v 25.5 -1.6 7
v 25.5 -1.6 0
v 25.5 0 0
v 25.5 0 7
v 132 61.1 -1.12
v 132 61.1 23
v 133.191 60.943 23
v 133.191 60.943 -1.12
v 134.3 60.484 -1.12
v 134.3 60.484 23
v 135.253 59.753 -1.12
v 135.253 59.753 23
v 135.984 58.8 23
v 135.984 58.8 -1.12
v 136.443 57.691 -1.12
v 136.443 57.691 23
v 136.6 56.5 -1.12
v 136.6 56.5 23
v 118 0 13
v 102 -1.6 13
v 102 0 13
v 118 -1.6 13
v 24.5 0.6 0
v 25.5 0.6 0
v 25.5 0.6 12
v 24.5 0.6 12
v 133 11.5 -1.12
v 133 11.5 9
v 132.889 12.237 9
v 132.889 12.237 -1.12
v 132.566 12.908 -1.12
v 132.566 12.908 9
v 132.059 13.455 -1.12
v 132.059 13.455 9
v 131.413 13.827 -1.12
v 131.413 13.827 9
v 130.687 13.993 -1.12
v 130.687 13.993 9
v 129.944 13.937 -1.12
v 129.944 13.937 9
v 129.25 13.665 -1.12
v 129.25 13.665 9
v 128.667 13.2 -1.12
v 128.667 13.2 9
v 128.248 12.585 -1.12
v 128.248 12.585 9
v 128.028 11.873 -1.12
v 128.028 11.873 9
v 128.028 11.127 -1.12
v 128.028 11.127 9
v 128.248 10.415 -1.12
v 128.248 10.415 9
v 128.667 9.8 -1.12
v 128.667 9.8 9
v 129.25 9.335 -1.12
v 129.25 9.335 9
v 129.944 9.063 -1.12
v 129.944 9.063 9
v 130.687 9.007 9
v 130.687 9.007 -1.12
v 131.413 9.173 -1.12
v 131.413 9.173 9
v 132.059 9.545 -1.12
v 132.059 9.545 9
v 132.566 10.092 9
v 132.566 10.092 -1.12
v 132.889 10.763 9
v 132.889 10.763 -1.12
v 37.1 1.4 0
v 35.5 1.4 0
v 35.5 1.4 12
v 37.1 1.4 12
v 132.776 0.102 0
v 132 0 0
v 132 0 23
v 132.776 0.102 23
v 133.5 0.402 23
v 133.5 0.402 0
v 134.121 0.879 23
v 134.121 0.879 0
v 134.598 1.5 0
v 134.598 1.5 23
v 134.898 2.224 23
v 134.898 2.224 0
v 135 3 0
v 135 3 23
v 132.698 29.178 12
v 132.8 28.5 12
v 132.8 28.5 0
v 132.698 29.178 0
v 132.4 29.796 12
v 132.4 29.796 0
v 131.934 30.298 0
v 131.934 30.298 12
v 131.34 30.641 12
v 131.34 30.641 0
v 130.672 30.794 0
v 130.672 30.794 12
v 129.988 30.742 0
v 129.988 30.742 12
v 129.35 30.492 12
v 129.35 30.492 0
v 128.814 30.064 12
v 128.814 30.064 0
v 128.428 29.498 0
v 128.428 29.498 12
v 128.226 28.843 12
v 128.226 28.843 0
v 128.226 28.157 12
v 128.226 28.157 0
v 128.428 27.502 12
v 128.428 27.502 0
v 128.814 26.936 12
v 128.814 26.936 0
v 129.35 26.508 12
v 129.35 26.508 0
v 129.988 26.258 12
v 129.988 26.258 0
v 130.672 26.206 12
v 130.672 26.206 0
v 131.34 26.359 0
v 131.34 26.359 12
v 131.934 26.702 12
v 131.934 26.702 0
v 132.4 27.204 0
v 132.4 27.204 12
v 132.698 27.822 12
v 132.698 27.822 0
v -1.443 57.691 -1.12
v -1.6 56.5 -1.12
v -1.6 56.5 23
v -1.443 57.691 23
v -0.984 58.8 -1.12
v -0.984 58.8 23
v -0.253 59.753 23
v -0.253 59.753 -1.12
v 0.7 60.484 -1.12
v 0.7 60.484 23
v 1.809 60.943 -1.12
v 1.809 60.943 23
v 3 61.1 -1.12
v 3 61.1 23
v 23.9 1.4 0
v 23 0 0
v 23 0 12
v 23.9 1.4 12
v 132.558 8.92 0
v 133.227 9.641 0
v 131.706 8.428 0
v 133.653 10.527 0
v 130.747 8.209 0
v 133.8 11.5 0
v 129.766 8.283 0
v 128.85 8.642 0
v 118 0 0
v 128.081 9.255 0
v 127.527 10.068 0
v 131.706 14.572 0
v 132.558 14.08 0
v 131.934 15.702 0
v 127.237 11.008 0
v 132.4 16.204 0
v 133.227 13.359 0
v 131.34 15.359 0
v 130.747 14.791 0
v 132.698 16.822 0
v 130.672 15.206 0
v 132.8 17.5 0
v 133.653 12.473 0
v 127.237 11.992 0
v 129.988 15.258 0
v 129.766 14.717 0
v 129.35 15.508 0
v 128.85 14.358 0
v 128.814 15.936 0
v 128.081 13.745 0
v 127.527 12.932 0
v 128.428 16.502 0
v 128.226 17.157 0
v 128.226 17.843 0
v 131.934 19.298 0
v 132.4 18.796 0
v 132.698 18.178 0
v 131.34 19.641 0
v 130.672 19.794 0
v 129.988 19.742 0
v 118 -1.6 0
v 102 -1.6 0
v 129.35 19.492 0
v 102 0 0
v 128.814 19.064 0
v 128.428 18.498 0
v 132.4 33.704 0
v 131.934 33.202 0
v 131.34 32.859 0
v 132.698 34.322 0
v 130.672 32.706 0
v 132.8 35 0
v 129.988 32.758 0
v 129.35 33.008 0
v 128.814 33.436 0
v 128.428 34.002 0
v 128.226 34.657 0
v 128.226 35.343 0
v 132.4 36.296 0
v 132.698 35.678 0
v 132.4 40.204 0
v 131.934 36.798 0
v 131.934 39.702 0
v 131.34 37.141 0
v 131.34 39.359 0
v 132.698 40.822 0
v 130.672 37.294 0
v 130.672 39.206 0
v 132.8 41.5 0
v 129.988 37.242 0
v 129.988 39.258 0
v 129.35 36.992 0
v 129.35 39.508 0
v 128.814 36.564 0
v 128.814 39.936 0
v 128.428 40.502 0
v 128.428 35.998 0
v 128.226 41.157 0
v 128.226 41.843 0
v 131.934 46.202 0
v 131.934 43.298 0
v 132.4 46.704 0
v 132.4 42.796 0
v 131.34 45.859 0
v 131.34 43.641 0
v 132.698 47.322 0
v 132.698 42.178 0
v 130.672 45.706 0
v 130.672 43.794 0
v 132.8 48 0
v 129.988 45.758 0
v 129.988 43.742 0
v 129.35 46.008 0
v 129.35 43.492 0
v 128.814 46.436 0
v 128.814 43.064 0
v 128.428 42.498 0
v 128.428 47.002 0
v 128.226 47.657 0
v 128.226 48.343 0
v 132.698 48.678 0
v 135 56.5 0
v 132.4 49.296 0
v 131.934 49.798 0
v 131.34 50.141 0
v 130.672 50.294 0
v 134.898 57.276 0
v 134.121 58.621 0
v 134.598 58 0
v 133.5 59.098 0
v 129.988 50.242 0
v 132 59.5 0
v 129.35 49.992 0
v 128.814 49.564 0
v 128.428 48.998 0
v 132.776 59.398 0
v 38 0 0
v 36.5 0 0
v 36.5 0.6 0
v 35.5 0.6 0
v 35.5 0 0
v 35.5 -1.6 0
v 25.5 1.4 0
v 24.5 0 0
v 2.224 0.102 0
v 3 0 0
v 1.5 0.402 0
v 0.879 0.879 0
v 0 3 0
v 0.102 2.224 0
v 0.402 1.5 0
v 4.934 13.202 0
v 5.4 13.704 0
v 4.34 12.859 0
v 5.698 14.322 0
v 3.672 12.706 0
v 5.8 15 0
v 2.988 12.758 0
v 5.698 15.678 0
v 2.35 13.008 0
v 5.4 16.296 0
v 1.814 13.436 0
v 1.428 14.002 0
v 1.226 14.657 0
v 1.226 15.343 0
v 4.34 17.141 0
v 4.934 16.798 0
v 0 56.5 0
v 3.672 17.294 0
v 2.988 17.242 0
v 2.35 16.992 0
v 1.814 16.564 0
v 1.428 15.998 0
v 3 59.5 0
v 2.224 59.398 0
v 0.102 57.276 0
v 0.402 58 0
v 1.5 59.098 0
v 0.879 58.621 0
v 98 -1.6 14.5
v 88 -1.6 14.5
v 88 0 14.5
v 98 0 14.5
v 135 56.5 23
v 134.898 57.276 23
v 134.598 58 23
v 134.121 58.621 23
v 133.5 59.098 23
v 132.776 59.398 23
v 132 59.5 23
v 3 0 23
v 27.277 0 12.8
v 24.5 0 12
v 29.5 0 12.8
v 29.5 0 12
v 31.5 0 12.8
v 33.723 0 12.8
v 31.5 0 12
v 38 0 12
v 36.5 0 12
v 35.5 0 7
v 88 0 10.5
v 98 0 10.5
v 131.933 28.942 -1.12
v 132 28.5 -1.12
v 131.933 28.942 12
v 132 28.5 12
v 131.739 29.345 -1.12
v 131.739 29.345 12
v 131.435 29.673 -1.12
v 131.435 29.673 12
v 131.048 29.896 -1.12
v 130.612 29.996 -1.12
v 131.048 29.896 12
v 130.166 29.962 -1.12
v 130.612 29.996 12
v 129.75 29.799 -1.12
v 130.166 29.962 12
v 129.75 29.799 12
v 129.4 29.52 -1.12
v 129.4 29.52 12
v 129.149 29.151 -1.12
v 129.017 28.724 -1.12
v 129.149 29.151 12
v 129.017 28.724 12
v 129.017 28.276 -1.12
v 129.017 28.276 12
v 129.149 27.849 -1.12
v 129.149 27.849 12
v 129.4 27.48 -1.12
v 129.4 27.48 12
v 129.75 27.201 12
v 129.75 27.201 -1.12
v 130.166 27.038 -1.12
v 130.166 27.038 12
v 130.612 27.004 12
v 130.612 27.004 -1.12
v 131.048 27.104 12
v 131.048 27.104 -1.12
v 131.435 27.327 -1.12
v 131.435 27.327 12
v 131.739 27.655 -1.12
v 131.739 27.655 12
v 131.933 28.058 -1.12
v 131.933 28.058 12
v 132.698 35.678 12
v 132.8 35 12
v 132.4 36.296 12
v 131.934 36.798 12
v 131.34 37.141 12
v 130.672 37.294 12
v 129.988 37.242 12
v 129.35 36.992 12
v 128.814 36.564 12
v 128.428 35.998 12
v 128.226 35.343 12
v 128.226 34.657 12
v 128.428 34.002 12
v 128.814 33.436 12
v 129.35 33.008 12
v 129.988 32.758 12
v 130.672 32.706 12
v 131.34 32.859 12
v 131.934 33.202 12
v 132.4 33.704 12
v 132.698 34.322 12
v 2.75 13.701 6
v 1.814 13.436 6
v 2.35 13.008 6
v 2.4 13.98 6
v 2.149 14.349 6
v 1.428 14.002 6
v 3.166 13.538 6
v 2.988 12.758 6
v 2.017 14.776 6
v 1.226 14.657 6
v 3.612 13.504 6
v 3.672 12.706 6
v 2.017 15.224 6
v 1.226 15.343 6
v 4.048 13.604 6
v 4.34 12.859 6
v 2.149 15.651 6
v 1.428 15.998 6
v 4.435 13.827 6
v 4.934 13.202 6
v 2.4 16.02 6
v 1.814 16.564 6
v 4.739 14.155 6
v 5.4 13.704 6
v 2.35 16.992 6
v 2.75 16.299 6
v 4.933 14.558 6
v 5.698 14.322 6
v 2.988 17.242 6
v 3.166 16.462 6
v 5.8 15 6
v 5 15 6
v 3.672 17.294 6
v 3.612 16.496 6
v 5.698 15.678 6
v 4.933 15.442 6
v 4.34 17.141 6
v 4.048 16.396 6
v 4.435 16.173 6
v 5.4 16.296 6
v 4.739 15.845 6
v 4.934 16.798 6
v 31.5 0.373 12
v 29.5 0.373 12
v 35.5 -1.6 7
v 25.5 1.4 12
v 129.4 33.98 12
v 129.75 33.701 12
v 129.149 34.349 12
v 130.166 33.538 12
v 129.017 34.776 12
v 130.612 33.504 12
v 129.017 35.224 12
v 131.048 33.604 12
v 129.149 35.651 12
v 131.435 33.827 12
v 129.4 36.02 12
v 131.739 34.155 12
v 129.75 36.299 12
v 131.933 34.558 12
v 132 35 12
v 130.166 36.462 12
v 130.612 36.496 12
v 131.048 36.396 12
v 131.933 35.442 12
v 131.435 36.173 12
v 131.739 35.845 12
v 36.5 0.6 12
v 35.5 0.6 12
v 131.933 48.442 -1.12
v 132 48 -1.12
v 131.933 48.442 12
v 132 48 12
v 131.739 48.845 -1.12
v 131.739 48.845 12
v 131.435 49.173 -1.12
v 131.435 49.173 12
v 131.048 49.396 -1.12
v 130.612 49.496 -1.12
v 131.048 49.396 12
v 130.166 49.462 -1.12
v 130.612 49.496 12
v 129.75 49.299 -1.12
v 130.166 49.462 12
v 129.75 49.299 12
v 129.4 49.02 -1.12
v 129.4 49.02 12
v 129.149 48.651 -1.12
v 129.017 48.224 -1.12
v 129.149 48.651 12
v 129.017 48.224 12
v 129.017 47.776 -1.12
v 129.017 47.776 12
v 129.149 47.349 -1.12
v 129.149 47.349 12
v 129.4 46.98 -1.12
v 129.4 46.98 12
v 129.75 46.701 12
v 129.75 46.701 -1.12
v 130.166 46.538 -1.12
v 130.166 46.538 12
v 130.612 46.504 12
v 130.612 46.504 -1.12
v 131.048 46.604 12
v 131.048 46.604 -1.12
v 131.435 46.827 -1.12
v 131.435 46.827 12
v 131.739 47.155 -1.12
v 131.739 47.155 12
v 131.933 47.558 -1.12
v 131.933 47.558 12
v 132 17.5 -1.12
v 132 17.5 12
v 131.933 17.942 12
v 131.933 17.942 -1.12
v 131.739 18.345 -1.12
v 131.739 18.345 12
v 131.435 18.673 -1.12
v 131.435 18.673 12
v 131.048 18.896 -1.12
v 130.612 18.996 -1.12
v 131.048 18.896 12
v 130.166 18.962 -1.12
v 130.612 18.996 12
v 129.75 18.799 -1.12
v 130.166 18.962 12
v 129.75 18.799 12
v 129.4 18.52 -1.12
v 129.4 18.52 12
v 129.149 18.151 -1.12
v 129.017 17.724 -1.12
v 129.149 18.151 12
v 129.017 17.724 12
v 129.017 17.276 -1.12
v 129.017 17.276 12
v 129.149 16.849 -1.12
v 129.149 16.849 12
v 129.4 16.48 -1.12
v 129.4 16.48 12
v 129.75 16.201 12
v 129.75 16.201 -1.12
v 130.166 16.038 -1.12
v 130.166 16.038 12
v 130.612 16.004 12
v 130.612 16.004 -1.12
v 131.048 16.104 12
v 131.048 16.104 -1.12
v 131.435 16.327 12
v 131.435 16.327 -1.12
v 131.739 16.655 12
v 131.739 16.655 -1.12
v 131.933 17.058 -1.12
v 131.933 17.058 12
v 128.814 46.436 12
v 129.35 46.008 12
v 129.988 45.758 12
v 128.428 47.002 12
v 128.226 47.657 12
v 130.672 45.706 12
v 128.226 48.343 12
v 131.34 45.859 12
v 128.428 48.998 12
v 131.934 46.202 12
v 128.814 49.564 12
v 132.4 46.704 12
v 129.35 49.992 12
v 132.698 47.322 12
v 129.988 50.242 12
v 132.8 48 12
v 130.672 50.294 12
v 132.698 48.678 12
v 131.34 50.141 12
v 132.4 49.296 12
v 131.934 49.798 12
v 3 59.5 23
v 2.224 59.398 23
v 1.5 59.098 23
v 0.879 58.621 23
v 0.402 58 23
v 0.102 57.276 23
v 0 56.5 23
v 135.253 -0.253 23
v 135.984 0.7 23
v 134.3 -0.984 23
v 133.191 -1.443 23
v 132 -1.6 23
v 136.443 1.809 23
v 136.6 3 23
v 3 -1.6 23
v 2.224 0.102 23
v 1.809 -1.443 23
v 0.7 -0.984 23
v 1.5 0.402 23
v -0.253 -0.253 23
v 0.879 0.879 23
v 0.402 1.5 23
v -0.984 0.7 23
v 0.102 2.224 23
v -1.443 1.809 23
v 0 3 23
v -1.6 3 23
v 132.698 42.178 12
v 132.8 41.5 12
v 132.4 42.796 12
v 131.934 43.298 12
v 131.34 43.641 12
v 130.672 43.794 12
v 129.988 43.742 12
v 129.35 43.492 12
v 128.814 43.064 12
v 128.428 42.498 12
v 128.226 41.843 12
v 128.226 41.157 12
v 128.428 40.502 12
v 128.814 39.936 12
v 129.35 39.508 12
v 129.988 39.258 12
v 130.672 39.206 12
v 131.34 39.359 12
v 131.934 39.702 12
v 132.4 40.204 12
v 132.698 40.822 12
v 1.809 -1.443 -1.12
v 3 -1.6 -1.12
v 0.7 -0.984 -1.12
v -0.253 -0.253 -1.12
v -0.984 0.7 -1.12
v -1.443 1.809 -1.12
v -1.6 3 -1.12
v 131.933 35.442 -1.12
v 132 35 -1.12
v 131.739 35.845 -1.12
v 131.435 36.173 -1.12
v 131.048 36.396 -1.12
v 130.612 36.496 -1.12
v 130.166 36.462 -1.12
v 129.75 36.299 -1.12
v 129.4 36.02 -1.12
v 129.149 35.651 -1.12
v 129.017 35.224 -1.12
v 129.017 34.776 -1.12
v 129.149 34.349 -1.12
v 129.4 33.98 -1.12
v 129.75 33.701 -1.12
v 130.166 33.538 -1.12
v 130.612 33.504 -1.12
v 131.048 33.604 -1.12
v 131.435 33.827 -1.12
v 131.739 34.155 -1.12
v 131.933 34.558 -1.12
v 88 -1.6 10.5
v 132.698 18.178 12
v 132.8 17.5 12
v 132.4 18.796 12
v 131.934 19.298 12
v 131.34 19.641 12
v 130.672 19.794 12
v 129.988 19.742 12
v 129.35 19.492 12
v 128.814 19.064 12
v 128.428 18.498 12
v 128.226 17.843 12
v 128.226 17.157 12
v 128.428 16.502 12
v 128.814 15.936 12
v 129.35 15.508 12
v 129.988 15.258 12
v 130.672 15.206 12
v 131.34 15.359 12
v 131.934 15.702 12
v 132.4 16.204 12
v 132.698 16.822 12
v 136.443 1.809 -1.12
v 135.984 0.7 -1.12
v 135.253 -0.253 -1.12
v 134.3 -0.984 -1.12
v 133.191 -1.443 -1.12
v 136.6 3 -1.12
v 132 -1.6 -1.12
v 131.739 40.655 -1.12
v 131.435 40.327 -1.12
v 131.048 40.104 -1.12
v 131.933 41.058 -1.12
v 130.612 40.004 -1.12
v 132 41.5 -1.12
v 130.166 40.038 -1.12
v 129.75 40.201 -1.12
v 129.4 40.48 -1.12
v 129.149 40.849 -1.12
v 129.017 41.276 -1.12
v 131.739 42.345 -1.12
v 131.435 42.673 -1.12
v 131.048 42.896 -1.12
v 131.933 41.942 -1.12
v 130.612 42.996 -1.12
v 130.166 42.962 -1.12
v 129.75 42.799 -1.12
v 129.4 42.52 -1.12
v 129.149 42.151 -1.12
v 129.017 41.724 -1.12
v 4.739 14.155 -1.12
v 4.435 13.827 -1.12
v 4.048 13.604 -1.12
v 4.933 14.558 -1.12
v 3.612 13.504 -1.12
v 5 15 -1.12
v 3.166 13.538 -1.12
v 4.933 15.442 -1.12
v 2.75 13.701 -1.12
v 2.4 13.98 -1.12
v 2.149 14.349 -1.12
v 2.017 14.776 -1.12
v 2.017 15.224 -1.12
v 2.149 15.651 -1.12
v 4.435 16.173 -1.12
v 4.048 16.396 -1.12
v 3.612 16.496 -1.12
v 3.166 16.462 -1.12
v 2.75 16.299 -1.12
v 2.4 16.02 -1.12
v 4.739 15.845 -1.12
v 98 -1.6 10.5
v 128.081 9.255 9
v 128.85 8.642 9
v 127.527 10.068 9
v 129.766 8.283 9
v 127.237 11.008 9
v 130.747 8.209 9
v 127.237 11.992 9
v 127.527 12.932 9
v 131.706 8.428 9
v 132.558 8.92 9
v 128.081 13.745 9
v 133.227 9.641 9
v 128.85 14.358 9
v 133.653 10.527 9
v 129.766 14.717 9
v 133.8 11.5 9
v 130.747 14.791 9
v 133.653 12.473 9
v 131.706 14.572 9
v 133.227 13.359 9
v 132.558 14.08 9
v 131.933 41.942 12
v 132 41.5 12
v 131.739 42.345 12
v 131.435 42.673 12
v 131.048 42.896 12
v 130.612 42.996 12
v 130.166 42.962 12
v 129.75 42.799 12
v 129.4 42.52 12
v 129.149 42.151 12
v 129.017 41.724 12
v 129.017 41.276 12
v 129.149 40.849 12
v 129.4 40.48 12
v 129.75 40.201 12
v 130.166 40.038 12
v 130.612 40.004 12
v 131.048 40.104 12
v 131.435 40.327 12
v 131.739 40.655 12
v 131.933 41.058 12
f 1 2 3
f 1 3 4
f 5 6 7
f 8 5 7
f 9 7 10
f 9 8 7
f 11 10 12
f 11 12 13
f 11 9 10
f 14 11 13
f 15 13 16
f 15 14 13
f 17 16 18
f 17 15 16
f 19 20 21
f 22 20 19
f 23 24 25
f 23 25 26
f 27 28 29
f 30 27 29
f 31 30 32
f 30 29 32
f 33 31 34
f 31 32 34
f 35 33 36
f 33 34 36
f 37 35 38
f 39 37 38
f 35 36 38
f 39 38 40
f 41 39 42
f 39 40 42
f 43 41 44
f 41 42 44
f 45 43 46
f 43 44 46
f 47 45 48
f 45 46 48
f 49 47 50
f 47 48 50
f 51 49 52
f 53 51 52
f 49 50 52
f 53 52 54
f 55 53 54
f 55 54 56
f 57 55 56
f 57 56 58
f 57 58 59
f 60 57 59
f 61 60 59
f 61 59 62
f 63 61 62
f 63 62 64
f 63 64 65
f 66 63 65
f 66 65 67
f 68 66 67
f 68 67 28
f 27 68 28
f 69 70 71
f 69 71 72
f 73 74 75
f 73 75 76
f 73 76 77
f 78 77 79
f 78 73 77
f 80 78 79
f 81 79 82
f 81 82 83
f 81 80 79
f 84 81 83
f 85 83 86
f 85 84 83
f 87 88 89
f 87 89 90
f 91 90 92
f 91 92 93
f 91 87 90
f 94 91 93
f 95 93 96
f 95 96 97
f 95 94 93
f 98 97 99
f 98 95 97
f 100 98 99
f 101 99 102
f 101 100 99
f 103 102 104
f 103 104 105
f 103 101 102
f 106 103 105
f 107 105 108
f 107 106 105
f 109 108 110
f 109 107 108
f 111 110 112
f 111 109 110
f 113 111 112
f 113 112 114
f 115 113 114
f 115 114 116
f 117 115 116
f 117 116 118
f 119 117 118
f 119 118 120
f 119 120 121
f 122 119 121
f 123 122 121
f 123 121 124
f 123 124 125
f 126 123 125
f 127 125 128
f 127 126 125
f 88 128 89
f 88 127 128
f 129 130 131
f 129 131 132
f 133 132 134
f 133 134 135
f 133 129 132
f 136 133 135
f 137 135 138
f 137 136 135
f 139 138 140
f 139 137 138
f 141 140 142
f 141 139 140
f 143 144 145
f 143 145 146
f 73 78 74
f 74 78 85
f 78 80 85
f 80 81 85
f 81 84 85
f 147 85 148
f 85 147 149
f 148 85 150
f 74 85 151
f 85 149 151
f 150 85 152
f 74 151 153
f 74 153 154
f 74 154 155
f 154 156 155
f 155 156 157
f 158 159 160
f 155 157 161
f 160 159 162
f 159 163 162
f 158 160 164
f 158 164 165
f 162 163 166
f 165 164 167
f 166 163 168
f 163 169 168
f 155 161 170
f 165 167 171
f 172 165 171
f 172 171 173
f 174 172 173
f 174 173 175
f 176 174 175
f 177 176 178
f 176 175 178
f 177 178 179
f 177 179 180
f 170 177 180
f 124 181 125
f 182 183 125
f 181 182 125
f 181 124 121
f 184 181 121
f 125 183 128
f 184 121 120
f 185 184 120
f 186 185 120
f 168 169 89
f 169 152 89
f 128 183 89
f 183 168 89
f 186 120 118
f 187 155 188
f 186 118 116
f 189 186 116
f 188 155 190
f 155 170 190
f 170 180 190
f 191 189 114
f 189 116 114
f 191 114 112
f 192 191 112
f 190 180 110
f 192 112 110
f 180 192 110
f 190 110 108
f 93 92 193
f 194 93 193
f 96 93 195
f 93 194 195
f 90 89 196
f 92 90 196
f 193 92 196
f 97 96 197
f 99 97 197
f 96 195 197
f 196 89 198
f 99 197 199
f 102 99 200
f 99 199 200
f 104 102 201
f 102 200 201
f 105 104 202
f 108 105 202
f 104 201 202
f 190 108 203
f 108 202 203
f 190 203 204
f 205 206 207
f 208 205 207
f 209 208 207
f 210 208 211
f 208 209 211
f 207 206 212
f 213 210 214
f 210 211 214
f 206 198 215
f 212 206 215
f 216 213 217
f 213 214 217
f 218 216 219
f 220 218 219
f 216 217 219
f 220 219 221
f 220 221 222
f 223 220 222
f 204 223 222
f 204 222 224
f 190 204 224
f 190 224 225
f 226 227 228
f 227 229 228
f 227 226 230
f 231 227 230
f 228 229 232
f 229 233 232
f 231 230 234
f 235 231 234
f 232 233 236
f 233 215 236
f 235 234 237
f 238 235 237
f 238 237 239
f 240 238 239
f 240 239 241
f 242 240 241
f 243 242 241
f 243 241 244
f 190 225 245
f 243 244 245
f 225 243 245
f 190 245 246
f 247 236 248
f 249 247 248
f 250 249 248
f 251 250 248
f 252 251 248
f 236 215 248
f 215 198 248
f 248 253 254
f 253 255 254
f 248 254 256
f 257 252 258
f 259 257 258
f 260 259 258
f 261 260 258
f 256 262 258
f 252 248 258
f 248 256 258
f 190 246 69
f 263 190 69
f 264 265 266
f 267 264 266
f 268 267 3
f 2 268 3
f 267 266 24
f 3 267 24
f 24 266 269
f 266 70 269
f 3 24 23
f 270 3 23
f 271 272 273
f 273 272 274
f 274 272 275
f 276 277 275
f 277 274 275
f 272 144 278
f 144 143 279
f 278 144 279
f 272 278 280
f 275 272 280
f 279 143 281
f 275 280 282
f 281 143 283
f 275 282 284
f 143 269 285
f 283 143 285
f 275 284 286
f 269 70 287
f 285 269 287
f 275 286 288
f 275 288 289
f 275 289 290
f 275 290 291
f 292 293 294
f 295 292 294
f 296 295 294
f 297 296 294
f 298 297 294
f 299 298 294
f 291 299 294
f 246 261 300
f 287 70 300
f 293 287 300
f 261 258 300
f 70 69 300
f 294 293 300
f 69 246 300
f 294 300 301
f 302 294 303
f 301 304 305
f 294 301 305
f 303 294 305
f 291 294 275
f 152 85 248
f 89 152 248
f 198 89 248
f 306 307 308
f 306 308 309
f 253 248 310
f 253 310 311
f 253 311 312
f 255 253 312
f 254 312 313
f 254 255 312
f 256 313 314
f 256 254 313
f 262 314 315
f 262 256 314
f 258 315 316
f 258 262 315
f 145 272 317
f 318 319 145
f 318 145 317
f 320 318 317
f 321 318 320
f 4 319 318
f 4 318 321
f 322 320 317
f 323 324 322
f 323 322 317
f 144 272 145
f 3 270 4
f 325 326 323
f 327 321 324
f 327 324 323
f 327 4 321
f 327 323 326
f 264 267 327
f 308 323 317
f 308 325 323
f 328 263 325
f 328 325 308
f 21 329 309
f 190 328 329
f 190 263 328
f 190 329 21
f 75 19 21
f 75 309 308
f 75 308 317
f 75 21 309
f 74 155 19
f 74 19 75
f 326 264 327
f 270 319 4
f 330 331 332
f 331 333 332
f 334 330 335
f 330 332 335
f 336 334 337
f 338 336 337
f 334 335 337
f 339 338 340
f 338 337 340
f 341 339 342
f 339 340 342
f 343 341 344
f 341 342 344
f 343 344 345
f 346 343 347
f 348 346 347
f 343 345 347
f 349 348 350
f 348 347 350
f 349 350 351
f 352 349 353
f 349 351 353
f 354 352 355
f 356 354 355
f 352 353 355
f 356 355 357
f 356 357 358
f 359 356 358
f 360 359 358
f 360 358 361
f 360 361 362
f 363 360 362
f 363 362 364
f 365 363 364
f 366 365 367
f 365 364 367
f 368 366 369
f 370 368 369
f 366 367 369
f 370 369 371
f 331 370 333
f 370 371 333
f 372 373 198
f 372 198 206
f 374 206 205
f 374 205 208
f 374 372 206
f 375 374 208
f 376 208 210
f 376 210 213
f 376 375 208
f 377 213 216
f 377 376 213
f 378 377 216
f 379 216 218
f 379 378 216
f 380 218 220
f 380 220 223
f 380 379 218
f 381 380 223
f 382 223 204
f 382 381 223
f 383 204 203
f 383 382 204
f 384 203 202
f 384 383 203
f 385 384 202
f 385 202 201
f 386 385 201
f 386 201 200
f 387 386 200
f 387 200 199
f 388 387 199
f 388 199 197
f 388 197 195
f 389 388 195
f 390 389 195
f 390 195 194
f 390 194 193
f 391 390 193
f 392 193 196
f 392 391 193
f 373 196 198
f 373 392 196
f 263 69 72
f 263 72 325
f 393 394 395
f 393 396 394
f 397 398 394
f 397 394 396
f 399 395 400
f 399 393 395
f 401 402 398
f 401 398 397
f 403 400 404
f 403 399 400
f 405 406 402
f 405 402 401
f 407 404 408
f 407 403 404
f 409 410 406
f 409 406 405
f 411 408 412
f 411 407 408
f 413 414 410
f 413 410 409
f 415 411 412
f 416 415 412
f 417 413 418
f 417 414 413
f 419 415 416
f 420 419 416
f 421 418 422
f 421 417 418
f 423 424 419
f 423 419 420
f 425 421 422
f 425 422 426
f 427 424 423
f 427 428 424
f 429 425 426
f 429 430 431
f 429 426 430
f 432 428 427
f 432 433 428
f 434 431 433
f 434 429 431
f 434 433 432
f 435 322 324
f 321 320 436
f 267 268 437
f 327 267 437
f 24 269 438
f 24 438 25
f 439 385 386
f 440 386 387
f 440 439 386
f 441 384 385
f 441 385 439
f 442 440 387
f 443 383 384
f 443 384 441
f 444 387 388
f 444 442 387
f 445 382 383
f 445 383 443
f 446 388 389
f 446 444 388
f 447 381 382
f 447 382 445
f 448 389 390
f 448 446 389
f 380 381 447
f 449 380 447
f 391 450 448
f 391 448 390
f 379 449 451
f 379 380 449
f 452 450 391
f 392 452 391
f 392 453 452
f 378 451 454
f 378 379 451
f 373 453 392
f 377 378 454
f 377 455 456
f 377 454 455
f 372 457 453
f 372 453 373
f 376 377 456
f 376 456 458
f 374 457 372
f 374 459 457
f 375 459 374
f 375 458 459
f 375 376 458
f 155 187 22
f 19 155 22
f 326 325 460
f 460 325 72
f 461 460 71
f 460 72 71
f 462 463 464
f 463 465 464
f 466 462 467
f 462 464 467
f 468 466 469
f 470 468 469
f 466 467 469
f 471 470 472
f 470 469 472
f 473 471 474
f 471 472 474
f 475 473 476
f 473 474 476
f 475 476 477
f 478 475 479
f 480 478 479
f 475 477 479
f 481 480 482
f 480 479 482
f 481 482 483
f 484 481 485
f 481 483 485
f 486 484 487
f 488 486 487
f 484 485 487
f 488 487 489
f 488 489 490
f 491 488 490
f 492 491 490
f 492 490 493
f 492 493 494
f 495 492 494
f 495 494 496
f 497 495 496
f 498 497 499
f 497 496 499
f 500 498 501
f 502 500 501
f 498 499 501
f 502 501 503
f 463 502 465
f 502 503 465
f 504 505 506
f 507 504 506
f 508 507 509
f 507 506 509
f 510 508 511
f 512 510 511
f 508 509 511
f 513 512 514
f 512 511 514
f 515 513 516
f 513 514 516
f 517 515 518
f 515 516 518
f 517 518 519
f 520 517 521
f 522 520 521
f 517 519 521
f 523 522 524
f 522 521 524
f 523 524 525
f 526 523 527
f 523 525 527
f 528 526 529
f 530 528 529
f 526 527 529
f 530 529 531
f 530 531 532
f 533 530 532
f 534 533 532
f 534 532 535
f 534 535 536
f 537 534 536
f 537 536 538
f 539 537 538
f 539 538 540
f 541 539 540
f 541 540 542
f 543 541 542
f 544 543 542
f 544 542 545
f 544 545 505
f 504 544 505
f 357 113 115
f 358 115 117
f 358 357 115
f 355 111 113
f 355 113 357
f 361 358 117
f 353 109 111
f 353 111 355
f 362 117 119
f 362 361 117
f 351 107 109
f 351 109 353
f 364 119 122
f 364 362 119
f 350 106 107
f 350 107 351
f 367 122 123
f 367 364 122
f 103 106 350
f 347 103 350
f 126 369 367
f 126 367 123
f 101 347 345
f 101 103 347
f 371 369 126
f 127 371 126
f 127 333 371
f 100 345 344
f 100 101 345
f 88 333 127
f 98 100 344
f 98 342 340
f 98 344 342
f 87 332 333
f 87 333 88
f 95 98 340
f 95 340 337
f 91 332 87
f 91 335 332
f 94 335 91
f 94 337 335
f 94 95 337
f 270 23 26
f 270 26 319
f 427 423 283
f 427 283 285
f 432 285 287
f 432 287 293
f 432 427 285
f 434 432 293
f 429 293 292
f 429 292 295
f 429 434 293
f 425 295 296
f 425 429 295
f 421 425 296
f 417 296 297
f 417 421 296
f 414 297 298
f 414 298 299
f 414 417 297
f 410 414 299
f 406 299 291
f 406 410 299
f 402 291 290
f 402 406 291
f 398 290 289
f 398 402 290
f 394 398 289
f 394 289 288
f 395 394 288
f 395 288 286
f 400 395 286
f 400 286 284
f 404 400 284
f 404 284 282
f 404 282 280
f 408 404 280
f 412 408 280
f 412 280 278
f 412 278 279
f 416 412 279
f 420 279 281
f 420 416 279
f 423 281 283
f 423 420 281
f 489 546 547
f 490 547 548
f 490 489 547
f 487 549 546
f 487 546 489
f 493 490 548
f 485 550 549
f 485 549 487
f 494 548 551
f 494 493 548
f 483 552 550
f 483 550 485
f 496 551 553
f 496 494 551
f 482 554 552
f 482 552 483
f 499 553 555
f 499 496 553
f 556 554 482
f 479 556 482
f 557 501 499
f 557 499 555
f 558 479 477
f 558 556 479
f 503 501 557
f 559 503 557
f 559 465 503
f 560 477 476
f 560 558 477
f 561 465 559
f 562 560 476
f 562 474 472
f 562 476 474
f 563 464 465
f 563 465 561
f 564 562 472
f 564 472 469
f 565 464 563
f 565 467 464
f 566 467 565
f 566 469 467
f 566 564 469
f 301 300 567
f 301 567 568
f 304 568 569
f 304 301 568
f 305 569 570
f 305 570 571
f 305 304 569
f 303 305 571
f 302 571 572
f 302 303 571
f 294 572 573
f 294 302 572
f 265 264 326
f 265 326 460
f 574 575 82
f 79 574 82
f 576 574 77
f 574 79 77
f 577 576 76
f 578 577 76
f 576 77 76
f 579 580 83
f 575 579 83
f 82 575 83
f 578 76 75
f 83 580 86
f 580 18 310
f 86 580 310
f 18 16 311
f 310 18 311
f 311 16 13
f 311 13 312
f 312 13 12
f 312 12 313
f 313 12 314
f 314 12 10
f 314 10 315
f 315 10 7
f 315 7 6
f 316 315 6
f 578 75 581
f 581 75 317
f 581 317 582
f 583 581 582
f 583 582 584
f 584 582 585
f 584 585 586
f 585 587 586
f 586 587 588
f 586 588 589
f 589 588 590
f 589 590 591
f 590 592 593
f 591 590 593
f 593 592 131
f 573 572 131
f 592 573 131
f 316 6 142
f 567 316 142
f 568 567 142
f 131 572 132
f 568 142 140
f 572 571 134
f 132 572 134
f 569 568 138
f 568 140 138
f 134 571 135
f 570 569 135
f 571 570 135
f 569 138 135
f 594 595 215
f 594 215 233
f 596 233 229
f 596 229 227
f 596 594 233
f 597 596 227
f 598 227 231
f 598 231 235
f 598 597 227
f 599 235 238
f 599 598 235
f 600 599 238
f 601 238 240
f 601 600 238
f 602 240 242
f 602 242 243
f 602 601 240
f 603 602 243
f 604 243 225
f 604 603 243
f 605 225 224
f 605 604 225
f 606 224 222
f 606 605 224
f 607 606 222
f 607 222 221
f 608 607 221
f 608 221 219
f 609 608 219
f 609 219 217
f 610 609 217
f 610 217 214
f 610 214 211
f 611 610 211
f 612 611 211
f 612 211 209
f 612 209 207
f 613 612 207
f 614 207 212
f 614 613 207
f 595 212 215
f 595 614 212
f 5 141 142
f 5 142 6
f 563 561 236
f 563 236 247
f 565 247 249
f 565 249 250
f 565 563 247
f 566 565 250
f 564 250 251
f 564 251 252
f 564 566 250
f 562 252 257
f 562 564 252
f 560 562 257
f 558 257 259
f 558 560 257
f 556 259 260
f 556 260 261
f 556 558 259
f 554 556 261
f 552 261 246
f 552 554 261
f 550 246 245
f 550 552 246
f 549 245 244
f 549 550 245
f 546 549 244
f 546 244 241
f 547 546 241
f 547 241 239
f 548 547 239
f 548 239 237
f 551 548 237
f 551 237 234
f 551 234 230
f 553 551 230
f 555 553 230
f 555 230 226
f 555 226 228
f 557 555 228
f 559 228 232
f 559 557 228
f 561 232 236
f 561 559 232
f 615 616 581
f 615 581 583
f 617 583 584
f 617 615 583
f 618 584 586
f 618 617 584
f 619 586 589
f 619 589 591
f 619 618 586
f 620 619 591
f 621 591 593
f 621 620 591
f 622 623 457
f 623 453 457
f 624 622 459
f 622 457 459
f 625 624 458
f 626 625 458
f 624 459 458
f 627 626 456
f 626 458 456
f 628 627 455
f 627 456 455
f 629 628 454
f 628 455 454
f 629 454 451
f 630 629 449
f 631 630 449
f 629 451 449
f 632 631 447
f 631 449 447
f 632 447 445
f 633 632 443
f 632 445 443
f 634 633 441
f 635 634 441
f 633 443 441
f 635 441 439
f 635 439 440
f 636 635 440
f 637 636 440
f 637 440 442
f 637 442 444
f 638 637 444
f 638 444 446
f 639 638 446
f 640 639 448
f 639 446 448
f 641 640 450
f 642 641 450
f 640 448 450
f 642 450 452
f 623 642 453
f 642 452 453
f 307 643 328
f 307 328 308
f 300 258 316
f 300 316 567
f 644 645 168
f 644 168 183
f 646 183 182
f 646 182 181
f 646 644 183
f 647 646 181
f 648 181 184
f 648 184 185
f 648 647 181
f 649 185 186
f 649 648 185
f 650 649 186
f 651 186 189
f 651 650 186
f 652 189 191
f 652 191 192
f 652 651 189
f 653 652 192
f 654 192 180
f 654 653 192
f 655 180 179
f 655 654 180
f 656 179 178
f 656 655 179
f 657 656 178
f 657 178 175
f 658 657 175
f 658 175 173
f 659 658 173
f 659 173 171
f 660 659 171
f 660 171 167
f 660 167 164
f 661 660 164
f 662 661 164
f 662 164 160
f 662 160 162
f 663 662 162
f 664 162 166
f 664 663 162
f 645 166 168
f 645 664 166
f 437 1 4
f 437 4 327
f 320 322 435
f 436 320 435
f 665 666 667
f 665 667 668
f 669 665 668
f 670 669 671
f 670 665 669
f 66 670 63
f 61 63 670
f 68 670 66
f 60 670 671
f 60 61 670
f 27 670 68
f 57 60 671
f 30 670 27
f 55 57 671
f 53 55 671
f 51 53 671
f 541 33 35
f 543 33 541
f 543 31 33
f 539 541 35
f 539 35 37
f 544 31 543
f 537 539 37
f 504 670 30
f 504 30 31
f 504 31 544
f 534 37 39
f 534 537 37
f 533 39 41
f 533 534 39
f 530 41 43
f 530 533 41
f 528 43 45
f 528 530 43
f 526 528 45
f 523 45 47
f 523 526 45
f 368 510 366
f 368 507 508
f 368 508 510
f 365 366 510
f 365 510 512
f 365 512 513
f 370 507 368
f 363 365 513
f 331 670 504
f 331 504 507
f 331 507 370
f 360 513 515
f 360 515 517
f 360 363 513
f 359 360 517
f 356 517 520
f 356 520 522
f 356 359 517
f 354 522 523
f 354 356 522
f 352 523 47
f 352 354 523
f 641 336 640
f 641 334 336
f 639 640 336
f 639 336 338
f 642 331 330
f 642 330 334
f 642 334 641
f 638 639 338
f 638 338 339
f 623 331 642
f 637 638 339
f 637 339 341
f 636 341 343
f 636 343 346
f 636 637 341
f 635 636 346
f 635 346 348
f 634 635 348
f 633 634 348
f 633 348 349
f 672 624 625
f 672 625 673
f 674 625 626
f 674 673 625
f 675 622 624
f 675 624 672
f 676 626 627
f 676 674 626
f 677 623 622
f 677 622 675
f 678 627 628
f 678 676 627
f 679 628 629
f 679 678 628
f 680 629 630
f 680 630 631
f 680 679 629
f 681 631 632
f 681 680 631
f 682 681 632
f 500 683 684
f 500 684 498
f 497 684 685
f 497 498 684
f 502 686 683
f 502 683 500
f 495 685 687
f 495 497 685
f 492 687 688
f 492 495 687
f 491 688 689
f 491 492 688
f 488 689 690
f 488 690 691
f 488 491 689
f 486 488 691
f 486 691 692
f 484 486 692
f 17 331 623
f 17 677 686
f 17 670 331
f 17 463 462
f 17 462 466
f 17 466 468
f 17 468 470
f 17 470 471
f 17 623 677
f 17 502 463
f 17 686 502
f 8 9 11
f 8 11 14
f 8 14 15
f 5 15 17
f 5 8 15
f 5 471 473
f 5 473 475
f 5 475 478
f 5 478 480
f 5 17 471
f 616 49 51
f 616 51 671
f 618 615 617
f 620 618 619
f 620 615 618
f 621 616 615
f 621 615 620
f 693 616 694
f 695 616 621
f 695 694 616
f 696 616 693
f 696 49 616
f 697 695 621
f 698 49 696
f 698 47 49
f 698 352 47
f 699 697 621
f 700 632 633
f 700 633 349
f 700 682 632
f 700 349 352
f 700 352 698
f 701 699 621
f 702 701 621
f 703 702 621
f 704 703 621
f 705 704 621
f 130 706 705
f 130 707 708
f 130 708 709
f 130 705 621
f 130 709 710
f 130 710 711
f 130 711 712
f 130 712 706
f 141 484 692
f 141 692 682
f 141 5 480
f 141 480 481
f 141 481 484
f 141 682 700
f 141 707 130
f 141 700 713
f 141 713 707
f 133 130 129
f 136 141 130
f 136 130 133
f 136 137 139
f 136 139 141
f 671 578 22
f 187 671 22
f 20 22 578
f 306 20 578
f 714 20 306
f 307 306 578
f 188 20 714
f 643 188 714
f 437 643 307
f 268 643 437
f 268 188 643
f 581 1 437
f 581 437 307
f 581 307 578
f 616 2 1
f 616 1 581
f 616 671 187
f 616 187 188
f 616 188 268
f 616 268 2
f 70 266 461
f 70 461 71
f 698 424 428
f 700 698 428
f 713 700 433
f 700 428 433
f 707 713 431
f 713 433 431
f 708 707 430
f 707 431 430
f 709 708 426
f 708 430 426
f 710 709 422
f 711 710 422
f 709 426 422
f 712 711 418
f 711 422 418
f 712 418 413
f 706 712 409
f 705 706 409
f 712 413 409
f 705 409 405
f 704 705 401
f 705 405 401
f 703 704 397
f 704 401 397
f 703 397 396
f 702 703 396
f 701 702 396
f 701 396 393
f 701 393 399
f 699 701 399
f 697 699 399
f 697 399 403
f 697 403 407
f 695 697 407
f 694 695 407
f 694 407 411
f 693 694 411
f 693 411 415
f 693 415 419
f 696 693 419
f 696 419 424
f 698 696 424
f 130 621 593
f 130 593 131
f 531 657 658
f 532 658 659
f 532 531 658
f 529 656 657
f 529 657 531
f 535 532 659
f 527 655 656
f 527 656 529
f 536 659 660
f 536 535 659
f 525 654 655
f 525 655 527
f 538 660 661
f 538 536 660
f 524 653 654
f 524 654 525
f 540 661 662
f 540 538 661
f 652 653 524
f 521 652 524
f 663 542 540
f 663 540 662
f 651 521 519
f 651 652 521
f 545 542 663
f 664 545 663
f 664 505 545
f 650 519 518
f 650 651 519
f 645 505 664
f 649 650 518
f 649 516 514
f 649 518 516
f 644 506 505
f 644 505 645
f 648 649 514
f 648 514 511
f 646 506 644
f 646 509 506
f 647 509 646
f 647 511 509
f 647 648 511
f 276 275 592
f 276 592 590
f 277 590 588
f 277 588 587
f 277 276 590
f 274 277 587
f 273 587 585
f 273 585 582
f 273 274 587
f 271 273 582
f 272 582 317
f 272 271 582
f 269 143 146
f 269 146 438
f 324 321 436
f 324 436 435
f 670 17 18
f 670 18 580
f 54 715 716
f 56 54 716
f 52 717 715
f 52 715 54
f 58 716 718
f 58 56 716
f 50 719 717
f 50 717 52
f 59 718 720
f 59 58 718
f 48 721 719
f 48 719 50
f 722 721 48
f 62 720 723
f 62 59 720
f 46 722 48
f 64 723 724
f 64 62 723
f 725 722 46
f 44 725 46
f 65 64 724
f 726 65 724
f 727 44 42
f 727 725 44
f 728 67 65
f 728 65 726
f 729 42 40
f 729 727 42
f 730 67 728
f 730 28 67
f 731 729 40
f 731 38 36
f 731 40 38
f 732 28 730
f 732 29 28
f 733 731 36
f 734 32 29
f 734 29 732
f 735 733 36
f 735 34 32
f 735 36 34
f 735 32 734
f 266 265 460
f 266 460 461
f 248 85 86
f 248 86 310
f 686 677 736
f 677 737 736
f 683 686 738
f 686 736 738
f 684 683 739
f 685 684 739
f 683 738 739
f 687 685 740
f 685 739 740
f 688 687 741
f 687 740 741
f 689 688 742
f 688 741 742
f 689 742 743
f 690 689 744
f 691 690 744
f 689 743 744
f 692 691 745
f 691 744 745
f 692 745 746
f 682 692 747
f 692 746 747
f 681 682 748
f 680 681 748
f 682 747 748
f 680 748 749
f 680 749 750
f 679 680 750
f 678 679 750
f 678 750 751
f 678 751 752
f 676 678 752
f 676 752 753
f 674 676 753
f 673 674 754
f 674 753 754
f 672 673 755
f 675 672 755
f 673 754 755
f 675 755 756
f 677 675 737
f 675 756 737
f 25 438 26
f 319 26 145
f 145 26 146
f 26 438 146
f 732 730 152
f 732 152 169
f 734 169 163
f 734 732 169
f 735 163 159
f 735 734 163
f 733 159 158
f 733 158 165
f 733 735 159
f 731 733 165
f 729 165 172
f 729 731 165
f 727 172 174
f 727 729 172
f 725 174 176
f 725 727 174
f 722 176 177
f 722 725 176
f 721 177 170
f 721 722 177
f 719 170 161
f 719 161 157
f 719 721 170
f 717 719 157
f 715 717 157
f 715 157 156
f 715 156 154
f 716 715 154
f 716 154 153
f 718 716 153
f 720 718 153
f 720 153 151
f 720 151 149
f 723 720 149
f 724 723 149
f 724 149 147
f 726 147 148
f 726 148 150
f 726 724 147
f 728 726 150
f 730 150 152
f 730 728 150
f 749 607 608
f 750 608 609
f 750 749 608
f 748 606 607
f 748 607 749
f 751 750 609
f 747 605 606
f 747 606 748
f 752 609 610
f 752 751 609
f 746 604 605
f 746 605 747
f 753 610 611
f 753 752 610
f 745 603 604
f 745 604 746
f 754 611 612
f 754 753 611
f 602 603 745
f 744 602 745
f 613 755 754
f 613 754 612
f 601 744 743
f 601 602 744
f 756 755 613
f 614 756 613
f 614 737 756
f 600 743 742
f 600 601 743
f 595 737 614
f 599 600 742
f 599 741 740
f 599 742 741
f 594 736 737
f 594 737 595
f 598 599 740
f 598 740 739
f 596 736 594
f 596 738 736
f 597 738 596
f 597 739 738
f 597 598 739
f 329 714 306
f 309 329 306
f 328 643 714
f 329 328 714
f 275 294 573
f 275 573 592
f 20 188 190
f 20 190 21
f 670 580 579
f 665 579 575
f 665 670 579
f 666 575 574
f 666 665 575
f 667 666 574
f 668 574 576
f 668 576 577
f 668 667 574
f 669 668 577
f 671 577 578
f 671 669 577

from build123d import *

# Parameters (mm, degrees)
PARED_DEPTH             = 23
CONECTORES_REACH        = 154.052
CROQUIS2_W              = 16
CROQUIS2_H              = 13
CROQUIS2_W_2            = 10
CROQUIS2_H_2            = 4
CROQUIS2_H_3            = 7
BASE_START              = -1.12
BASE_FRENTE_DEPTH       = 1.12
LUCES_REACH             = 153.399
CROQUIS3_R              = 1.5
CROQUIS3_R_2            = 2.5
SALIENTE_EXTRUIR1_START = 12
CROQUIS3_3_R            = 2.3
CROQUIS3_3_R_2          = 1.5
SALIENTE_EXTRUIR1_DEPTH = 12
SALIENTE_EXTRUIR2_START = 9
CROQUIS3_4_R            = 3.3
CROQUIS3_4_R_2          = 2.5
SALIENTE_EXTRUIR2_DEPTH = 9
SALIENTE_EXTRUIR3_START = 6
CROQUIS3_5_R            = 2.3
CROQUIS3_5_R_2          = 1.5
SALIENTE_EXTRUIR3_DEPTH = 6
SALIENTE_EXTRUIR4_DEPTH = 12
CROQUIS5_W              = 2
CROQUIS5_H              = 0.8
SALIENTE_EXTRUIR5_DEPTH = 0.4
CHAFL_N1_SIZE           = 0.4
CHAFL_N1_SIZE_2         = 0.857802768


with BuildPart() as part:
    # Croquis1 → pared (new body)
    with BuildSketch(Plane.XY):
        with BuildLine():
            Line((3, 61.1), (132, 61.1))
            ThreePointArc((132, 61.1), (135.252691193, 59.752691193), (136.6, 56.5))
            Line((136.6, 56.5), (136.6, 3))
            ThreePointArc((136.6, 3), (135.252691193, -0.252691193), (132, -1.6))
            Line((132, -1.6), (3, -1.6))
            ThreePointArc((3, -1.6), (-0.252691193, -0.252691193), (-1.6, 3))
            Line((-1.6, 3), (-1.6, 56.5))
            ThreePointArc((-1.6, 56.5), (-0.252691193, 59.752691193), (3, 61.1))
        make_face()
        with BuildLine():
            Line((3, 0), (132, 0))
            ThreePointArc((132, 0), (134.121320344, 0.878679656), (135, 3))
            Line((135, 3), (135, 56.5))
            ThreePointArc((135, 56.5), (134.121320344, 58.621320344), (132, 59.5))
            Line((132, 59.5), (3, 59.5))
            ThreePointArc((3, 59.5), (0.878679656, 58.621320344), (0, 56.5))
            Line((0, 56.5), (0, 3))
            ThreePointArc((0, 3), (0.878679656, 0.878679656), (3, 0))
        make_face(mode=Mode.SUBTRACT)
    extrude(amount=PARED_DEPTH)

    # Croquis2 → conectores (cut, up to next)
    with BuildSketch(Plane.XZ.offset(1.6), mode=Mode.PRIVATE) as conectores_sk1:
        with Locations((110, 6.5)):
            Rectangle(CROQUIS2_W, CROQUIS2_H)
    conectores_tool1 = extrude(conectores_sk1.sketch, amount=-CONECTORES_REACH, mode=Mode.PRIVATE) & part.part
    # Croquis2 → conectores (cut, up to next)
    with BuildSketch(Plane.XZ.offset(1.6), mode=Mode.PRIVATE) as conectores_sk2:
        with Locations((93, 12.5)):
            Rectangle(CROQUIS2_W_2, CROQUIS2_H_2)
    conectores_tool2 = extrude(conectores_sk2.sketch, amount=-CONECTORES_REACH, mode=Mode.PRIVATE) & part.part
    # Croquis2 → conectores (cut, up to next)
    with BuildSketch(Plane.XZ.offset(1.6), mode=Mode.PRIVATE) as conectores_sk3:
        with Locations((30.5, 3.5)):
            Rectangle(CROQUIS2_W_2, CROQUIS2_H_3)
    conectores_tool3 = extrude(conectores_sk3.sketch, amount=-CONECTORES_REACH, mode=Mode.PRIVATE) & part.part
    add(conectores_tool1.solids().sort_by_distance((110, -1.6, 6.5))[0], mode=Mode.SUBTRACT)
    add(conectores_tool2.solids().sort_by_distance((93, -1.6, 12.5))[0], mode=Mode.SUBTRACT)
    add(conectores_tool3.solids().sort_by_distance((30.5, -1.6, 3.5))[0], mode=Mode.SUBTRACT)

    # Croquis1<2> → base frente (add)
    with BuildSketch(Plane.XY.offset(BASE_START)):
        with BuildLine():
            Line((3, 61.1), (132, 61.1))
            ThreePointArc((132, 61.1), (135.252691193, 59.752691193), (136.6, 56.5))
            Line((136.6, 56.5), (136.6, 3))
            ThreePointArc((136.6, 3), (135.252691193, -0.252691193), (132, -1.6))
            Line((132, -1.6), (3, -1.6))
            ThreePointArc((3, -1.6), (-0.252691193, -0.252691193), (-1.6, 3))
            Line((-1.6, 3), (-1.6, 56.5))
            ThreePointArc((-1.6, 56.5), (-0.252691193, 59.752691193), (3, 61.1))
        make_face()
    extrude(amount=BASE_FRENTE_DEPTH)

    # Croquis3 → luces (cut, up to next)
    with BuildSketch(Plane.XY, mode=Mode.PRIVATE) as luces_sk1:
        with Locations((130.5, 48)):
            Circle(CROQUIS3_R)
    luces_tool1 = extrude(luces_sk1.sketch, amount=-LUCES_REACH, mode=Mode.PRIVATE) & part.part
    # Croquis3 → luces (cut, up to next)
    with BuildSketch(Plane.XY, mode=Mode.PRIVATE) as luces_sk2:
        with Locations((130.5, 41.5)):
            Circle(CROQUIS3_R)
    luces_tool2 = extrude(luces_sk2.sketch, amount=-LUCES_REACH, mode=Mode.PRIVATE) & part.part
    # Croquis3 → luces (cut, up to next)
    with BuildSketch(Plane.XY, mode=Mode.PRIVATE) as luces_sk3:
        with Locations((130.5, 35)):
            Circle(CROQUIS3_R)
    luces_tool3 = extrude(luces_sk3.sketch, amount=-LUCES_REACH, mode=Mode.PRIVATE) & part.part
    # Croquis3 → luces (cut, up to next)
    with BuildSketch(Plane.XY, mode=Mode.PRIVATE) as luces_sk4:
        with Locations((130.5, 28.5)):
            Circle(CROQUIS3_R)
    luces_tool4 = extrude(luces_sk4.sketch, amount=-LUCES_REACH, mode=Mode.PRIVATE) & part.part
    # Croquis3 → luces (cut, up to next)
    with BuildSketch(Plane.XY, mode=Mode.PRIVATE) as luces_sk5:
        with Locations((130.5, 17.5)):
            Circle(CROQUIS3_R)
    luces_tool5 = extrude(luces_sk5.sketch, amount=-LUCES_REACH, mode=Mode.PRIVATE) & part.part
    # Croquis3 → luces (cut, up to next)
    with BuildSketch(Plane.XY, mode=Mode.PRIVATE) as luces_sk6:
        with Locations((130.5, 11.5)):
            Circle(CROQUIS3_R_2)
    luces_tool6 = extrude(luces_sk6.sketch, amount=-LUCES_REACH, mode=Mode.PRIVATE) & part.part
    # Croquis3 → luces (cut, up to next)
    with BuildSketch(Plane.XY, mode=Mode.PRIVATE) as luces_sk7:
        with Locations((3.5, 15)):
            Circle(CROQUIS3_R)
    luces_tool7 = extrude(luces_sk7.sketch, amount=-LUCES_REACH, mode=Mode.PRIVATE) & part.part
    add(luces_tool1.solids().sort_by_distance((130.5, 48, 0))[0], mode=Mode.SUBTRACT)
    add(luces_tool2.solids().sort_by_distance((130.5, 41.5, 0))[0], mode=Mode.SUBTRACT)
    add(luces_tool3.solids().sort_by_distance((130.5, 35, 0))[0], mode=Mode.SUBTRACT)
    add(luces_tool4.solids().sort_by_distance((130.5, 28.5, 0))[0], mode=Mode.SUBTRACT)
    add(luces_tool5.solids().sort_by_distance((130.5, 17.5, 0))[0], mode=Mode.SUBTRACT)
    add(luces_tool6.solids().sort_by_distance((130.5, 11.5, 0))[0], mode=Mode.SUBTRACT)
    add(luces_tool7.solids().sort_by_distance((3.5, 15, 0))[0], mode=Mode.SUBTRACT)

    # Croquis3<3> → Saliente-Extruir1 (add)
    # profile 1 of 5: a face of its own
    with BuildSketch(Plane.XY.offset(SALIENTE_EXTRUIR1_START)):
        with Locations((130.5, 17.5)):
            Circle(CROQUIS3_3_R)
        with Locations((130.5, 17.5)):
            Circle(CROQUIS3_3_R_2, mode=Mode.SUBTRACT)
    # profile 2 of 5: a face of its own
    with BuildSketch(Plane.XY.offset(SALIENTE_EXTRUIR1_START)):
        with Locations((130.5, 28.5)):
            Circle(CROQUIS3_3_R)
        with Locations((130.5, 28.5)):
            Circle(CROQUIS3_3_R_2, mode=Mode.SUBTRACT)
    # profile 3 of 5: a face of its own
    with BuildSketch(Plane.XY.offset(SALIENTE_EXTRUIR1_START)):
        with Locations((130.5, 35)):
            Circle(CROQUIS3_3_R)
        with Locations((130.5, 35)):
            Circle(CROQUIS3_3_R_2, mode=Mode.SUBTRACT)
    # profile 4 of 5: a face of its own
    with BuildSketch(Plane.XY.offset(SALIENTE_EXTRUIR1_START)):
        with Locations((130.5, 41.5)):
            Circle(CROQUIS3_3_R)
        with Locations((130.5, 41.5)):
            Circle(CROQUIS3_3_R_2, mode=Mode.SUBTRACT)
    # profile 5 of 5: a face of its own
    with BuildSketch(Plane.XY.offset(SALIENTE_EXTRUIR1_START)):
        with Locations((130.5, 48)):
            Circle(CROQUIS3_3_R)
        with Locations((130.5, 48)):
            Circle(CROQUIS3_3_R_2, mode=Mode.SUBTRACT)
    extrude(amount=-SALIENTE_EXTRUIR1_DEPTH)

    # Croquis3<4> → Saliente-Extruir2 (add)
    with BuildSketch(Plane.XY.offset(SALIENTE_EXTRUIR2_START)):
        with Locations((130.5, 11.5)):
            Circle(CROQUIS3_4_R)
        with Locations((130.5, 11.5)):
            Circle(CROQUIS3_4_R_2, mode=Mode.SUBTRACT)
    extrude(amount=-SALIENTE_EXTRUIR2_DEPTH)

    # Croquis3<5> → Saliente-Extruir3 (add)
    with BuildSketch(Plane.XY.offset(SALIENTE_EXTRUIR3_START)):
        with Locations((3.5, 15)):
            Circle(CROQUIS3_5_R)
        with Locations((3.5, 15)):
            Circle(CROQUIS3_5_R_2, mode=Mode.SUBTRACT)
    extrude(amount=-SALIENTE_EXTRUIR3_DEPTH)

    # Croquis4 → Saliente-Extruir4 (add)
    with BuildSketch(Plane.XY):
        Polygon((36.5, 0), (36.5, 0.6), (35.5, 0.6), (35.5, 1.4), (37.1, 1.4), (38, 0), align=None)
        Polygon((24.5, 0), (23, 0), (23.9, 1.4), (25.5, 1.4), (25.5, 0.6), (24.5, 0.6), align=None)
    extrude(amount=SALIENTE_EXTRUIR4_DEPTH)

    # Croquis5 → Saliente-Extruir5 (add)
    with BuildSketch(Plane(origin=(0, 0, 0), x_dir=(1, 0, 0), z_dir=(0, 1, 0))):
        with Locations((30.5, -12.4)):
            Rectangle(CROQUIS5_W, CROQUIS5_H)
    extrude(amount=SALIENTE_EXTRUIR5_DEPTH)

    # Chaflán1
    # the kernel refuses this chamfer: 0.857802768, 0.4 mm, written as the material it takes off along each edge
    with BuildSketch(Plane(origin=(27.277454068, 0.4, 12.8), x_dir=(0, -0.9971975577536771, 0.07481330637060238), z_dir=(1, 0, 0))) as chafl_n1_piece_1_section:
        Polygon((CHAFL_N1_SIZE * 0.997197557754, CHAFL_N1_SIZE * 0.0748133063706), (-CHAFL_N1_SIZE_2 * 0.0748133063884, CHAFL_N1_SIZE_2 * 0.997197557991), (0, 0), align=None)
    chafl_n1_piece_1 = extrude(amount=6.445091863, mode=Mode.PRIVATE)
    chafl_n1_piece_1 = split(chafl_n1_piece_1, bisect_by=Plane(origin=(30.5, 0, 12.509130299), z_dir=(0, 1, 0)), keep=Keep.TOP, mode=Mode.PRIVATE)
    add(chafl_n1_piece_1, mode=Mode.SUBTRACT)


solid = part.part
